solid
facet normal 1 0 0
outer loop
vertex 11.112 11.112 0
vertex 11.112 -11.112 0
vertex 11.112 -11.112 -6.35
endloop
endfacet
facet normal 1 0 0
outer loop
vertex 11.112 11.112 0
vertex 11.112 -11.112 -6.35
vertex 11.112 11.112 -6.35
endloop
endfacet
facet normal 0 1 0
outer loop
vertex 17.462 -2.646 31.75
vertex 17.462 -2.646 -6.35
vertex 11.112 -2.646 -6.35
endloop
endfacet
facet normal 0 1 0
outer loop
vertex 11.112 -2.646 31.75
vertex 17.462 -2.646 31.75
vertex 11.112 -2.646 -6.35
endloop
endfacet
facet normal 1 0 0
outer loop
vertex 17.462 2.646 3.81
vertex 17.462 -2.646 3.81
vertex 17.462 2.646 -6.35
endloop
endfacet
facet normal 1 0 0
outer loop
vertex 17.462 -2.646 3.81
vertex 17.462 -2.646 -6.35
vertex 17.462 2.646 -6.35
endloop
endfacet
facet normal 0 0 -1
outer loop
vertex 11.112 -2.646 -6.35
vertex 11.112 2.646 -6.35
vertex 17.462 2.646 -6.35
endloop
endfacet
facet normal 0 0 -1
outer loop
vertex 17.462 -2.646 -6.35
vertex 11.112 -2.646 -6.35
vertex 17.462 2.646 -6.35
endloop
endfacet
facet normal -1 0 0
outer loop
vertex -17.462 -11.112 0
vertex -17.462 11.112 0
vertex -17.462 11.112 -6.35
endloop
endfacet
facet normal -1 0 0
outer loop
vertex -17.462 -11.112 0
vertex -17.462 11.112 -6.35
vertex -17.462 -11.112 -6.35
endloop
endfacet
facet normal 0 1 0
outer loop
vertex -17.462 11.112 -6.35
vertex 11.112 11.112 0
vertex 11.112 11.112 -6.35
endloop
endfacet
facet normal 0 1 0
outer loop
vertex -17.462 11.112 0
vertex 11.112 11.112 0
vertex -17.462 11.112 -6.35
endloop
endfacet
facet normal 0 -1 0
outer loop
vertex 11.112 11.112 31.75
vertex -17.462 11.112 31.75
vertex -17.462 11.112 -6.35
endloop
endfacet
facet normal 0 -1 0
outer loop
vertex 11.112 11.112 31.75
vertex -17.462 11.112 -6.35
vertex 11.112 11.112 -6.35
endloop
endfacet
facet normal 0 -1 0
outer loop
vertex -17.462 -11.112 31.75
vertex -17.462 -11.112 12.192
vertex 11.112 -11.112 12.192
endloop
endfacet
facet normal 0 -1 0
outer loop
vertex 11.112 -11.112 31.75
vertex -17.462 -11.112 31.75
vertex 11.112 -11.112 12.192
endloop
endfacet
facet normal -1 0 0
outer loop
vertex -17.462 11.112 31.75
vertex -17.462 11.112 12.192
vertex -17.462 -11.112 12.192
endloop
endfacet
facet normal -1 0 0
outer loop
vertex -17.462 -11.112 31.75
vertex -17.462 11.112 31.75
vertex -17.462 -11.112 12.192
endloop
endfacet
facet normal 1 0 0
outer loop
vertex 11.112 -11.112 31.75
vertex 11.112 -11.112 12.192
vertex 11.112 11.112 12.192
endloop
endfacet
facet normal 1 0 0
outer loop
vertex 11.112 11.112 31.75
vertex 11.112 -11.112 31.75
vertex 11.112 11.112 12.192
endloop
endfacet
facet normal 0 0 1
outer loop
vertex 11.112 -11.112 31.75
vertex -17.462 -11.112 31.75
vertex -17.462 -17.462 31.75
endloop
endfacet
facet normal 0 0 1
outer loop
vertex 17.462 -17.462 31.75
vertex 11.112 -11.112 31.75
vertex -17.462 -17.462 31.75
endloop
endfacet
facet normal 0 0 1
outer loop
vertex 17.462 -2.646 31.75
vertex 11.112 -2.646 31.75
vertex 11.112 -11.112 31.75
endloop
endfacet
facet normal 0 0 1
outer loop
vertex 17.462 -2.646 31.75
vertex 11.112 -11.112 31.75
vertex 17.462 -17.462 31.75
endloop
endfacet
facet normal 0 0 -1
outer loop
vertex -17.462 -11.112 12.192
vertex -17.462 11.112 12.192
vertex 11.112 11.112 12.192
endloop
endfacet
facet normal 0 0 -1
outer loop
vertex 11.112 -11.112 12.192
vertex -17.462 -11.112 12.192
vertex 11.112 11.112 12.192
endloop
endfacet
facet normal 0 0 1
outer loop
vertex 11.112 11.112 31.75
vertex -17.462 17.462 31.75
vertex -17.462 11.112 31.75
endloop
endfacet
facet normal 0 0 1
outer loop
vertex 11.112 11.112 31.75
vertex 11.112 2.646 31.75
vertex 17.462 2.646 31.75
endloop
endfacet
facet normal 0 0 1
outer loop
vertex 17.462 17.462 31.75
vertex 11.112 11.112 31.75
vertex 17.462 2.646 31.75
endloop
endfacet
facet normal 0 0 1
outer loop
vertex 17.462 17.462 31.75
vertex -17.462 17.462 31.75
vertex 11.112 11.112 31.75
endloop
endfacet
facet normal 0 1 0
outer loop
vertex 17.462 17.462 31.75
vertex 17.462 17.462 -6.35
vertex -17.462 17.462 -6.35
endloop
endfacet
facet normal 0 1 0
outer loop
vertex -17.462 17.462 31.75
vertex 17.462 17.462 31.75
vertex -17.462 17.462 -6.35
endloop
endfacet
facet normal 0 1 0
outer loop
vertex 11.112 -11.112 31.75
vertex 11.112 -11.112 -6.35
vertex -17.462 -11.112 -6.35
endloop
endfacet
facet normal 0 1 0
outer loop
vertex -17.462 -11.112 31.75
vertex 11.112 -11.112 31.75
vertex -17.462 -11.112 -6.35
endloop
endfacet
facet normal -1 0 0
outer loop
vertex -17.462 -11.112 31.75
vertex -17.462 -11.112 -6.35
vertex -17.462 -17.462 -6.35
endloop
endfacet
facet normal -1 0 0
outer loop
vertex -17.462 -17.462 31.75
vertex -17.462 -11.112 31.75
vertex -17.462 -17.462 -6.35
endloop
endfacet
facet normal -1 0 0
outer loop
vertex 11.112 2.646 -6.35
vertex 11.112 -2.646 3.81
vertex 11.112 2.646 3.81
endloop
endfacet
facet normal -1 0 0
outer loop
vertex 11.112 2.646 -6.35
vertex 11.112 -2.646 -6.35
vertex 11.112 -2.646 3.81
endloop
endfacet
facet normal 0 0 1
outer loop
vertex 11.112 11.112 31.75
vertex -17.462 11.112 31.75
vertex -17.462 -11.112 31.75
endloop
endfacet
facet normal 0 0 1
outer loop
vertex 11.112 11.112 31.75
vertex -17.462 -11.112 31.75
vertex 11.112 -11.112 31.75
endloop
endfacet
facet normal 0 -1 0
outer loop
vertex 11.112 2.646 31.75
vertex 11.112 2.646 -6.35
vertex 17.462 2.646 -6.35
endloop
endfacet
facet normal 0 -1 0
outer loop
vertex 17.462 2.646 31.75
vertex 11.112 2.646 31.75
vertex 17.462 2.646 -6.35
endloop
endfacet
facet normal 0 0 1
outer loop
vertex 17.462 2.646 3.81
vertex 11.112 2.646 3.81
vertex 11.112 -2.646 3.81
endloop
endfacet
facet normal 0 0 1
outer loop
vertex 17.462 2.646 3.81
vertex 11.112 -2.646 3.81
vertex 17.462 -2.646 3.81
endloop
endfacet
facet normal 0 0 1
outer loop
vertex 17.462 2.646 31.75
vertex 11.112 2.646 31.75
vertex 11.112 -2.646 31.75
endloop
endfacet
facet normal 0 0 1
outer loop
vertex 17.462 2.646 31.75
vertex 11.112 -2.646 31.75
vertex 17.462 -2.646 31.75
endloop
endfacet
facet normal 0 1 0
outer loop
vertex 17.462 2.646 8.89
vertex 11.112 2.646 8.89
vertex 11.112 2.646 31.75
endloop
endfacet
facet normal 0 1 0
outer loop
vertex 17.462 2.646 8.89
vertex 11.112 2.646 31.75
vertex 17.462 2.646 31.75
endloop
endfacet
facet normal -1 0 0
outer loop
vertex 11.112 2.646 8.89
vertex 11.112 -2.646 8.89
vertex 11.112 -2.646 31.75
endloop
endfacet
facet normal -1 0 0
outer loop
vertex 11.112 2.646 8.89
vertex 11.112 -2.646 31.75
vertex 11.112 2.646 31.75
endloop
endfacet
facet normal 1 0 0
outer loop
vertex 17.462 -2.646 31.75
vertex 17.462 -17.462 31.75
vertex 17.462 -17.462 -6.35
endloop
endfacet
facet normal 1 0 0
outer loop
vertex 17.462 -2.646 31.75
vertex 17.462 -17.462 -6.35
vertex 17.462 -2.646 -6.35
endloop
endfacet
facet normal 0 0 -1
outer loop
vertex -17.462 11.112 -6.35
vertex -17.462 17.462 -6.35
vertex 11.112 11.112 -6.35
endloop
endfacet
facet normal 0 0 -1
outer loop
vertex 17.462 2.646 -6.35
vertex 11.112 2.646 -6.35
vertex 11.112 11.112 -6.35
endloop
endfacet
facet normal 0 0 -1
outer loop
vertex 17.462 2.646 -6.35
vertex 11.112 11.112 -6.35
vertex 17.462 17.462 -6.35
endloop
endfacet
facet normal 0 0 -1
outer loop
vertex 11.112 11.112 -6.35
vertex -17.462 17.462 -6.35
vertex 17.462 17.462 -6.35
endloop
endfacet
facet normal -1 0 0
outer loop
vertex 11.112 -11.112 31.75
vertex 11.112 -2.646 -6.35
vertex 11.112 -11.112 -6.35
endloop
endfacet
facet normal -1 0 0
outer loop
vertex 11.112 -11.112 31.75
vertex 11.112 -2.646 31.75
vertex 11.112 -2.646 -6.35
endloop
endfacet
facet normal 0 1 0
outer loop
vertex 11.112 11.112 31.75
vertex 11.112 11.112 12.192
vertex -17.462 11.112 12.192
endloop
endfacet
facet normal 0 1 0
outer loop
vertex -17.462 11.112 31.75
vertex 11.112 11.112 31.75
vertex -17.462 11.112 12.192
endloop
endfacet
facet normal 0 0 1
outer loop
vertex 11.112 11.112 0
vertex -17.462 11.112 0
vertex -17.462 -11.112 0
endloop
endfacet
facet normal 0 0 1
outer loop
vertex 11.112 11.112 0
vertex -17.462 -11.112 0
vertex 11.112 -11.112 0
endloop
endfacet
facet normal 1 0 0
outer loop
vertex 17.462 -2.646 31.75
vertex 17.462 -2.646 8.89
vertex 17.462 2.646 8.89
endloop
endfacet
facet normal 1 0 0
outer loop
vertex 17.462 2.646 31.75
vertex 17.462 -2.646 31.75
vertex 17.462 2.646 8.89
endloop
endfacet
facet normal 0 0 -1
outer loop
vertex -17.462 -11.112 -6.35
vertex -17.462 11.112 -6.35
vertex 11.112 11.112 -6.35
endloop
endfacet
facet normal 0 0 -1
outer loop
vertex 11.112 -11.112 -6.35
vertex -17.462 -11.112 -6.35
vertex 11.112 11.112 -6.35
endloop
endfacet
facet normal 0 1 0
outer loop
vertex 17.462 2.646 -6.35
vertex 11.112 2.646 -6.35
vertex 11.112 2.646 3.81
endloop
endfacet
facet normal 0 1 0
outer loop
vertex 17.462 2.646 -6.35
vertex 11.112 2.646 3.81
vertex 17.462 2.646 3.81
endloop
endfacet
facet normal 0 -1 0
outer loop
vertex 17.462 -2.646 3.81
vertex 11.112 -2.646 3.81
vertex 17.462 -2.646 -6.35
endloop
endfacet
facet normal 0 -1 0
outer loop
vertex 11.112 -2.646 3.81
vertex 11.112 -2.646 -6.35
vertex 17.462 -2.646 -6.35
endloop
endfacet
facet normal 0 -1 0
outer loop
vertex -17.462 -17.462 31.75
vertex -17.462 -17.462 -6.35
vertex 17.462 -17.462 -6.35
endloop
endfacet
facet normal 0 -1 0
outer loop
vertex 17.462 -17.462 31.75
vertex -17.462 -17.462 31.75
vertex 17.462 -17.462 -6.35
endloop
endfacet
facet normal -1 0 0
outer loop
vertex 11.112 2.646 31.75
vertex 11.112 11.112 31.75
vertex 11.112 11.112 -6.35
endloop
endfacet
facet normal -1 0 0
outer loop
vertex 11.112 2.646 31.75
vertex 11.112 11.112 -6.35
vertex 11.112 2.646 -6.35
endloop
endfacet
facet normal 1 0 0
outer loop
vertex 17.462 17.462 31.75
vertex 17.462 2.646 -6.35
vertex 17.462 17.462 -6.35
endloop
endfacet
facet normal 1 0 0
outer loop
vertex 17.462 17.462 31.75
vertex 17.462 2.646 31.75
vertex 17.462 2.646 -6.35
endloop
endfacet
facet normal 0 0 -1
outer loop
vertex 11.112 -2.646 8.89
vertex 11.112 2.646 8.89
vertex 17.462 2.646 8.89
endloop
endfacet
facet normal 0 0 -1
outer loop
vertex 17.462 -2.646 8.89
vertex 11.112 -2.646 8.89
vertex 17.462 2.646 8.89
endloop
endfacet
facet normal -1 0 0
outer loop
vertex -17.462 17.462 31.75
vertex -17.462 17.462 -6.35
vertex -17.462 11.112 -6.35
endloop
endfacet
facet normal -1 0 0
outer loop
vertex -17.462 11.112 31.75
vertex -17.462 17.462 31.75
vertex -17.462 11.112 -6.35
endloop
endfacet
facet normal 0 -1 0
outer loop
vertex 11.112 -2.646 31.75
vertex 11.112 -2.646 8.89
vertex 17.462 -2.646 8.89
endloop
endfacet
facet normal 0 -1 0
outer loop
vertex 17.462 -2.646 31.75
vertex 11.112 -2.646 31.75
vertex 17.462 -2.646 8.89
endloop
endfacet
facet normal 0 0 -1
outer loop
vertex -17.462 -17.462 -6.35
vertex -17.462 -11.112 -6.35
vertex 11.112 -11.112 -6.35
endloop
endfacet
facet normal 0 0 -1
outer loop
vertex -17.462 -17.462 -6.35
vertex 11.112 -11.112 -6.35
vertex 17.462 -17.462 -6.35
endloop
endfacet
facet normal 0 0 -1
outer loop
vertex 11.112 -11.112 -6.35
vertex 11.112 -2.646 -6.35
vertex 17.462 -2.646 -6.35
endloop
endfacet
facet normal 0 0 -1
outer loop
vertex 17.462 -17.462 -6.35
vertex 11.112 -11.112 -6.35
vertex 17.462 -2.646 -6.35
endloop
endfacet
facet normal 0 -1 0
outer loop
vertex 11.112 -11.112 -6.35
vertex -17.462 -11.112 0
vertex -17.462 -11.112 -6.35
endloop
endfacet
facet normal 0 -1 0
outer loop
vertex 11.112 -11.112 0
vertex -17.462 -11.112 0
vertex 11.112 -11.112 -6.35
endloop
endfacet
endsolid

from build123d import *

# Parameters (mm, degrees)
F1_START      = 12.192
F1_DEPTH      = 19.558
F2_DEPTH      = 6.35
F3_DEPTH      = 31.75
F3_DEPTH_BACK = 6.35
F0_W          = 6.35
F0_H          = 5.2916666667
F4_DEPTH      = 6.35
F4_DEPTH_BACK = 3.81
F5_START      = 8.89
F5_DEPTH      = 22.86


with BuildPart() as f1:
    # F0 (on Top) → F1 (new body)
    with BuildSketch(Plane.XY.offset(F1_START)):
        Polygon((11.1125, 11.1125), (-17.4625, 11.1125), (-17.4625, -11.1125), (11.1125, -11.1125), (11.1125, -2.6458333333), (11.1125, 2.6458333333), align=None)
    extrude(amount=F1_DEPTH)


with BuildPart() as f2:
    # F0 (on Top) → F2 (new body)
    with BuildSketch(Plane.XY):
        Polygon((11.1125, 11.1125), (-17.4625, 11.1125), (-17.4625, -11.1125), (11.1125, -11.1125), (11.1125, -2.6458333333), (11.1125, 2.6458333333), align=None)
    extrude(amount=-F2_DEPTH)


with BuildPart() as f3:
    # F0 (on Top) → F3 (new body, two sides)
    with BuildSketch(Plane.XY) as f3_sk:
        Polygon((17.4625, 17.4625), (-17.4625, 17.4625), (-17.4625, 11.1125), (11.1125, 11.1125), (11.1125, 2.6458333333), (17.4625, 2.6458333333), align=None)
    extrude(amount=F3_DEPTH)
    extrude(f3_sk.sketch, amount=-F3_DEPTH_BACK)


with BuildPart() as f3b:
    # F0 (on Top) → F3, piece 2 (new body, two sides)
    with BuildSketch(Plane.XY) as f3_2_sk:
        Polygon((11.1125, -11.1125), (-17.4625, -11.1125), (-17.4625, -17.4625), (17.4625, -17.4625), (17.4625, -2.6458333333), (11.1125, -2.6458333333), align=None)
    extrude(amount=F3_DEPTH)
    extrude(f3_2_sk.sketch, amount=-F3_DEPTH_BACK)


with BuildPart() as f4:
    # F0 (on Top) → F4 (new body, two sides)
    with BuildSketch(Plane.XY) as f4_sk:
        with Locations((14.2875, 0)):
            Rectangle(F0_W, F0_H)
    extrude(amount=-F4_DEPTH)
    extrude(f4_sk.sketch, amount=F4_DEPTH_BACK)


with BuildPart() as f5:
    # F0 (on Top) → F5 (new body)
    with BuildSketch(Plane.XY.offset(F5_START)):
        with Locations((14.2875, 0)):
            Rectangle(F0_W, F0_H)
    extrude(amount=F5_DEPTH)


solid = Compound([f1.part, f2.part, f3.part, f3b.part, f4.part, f5.part])
